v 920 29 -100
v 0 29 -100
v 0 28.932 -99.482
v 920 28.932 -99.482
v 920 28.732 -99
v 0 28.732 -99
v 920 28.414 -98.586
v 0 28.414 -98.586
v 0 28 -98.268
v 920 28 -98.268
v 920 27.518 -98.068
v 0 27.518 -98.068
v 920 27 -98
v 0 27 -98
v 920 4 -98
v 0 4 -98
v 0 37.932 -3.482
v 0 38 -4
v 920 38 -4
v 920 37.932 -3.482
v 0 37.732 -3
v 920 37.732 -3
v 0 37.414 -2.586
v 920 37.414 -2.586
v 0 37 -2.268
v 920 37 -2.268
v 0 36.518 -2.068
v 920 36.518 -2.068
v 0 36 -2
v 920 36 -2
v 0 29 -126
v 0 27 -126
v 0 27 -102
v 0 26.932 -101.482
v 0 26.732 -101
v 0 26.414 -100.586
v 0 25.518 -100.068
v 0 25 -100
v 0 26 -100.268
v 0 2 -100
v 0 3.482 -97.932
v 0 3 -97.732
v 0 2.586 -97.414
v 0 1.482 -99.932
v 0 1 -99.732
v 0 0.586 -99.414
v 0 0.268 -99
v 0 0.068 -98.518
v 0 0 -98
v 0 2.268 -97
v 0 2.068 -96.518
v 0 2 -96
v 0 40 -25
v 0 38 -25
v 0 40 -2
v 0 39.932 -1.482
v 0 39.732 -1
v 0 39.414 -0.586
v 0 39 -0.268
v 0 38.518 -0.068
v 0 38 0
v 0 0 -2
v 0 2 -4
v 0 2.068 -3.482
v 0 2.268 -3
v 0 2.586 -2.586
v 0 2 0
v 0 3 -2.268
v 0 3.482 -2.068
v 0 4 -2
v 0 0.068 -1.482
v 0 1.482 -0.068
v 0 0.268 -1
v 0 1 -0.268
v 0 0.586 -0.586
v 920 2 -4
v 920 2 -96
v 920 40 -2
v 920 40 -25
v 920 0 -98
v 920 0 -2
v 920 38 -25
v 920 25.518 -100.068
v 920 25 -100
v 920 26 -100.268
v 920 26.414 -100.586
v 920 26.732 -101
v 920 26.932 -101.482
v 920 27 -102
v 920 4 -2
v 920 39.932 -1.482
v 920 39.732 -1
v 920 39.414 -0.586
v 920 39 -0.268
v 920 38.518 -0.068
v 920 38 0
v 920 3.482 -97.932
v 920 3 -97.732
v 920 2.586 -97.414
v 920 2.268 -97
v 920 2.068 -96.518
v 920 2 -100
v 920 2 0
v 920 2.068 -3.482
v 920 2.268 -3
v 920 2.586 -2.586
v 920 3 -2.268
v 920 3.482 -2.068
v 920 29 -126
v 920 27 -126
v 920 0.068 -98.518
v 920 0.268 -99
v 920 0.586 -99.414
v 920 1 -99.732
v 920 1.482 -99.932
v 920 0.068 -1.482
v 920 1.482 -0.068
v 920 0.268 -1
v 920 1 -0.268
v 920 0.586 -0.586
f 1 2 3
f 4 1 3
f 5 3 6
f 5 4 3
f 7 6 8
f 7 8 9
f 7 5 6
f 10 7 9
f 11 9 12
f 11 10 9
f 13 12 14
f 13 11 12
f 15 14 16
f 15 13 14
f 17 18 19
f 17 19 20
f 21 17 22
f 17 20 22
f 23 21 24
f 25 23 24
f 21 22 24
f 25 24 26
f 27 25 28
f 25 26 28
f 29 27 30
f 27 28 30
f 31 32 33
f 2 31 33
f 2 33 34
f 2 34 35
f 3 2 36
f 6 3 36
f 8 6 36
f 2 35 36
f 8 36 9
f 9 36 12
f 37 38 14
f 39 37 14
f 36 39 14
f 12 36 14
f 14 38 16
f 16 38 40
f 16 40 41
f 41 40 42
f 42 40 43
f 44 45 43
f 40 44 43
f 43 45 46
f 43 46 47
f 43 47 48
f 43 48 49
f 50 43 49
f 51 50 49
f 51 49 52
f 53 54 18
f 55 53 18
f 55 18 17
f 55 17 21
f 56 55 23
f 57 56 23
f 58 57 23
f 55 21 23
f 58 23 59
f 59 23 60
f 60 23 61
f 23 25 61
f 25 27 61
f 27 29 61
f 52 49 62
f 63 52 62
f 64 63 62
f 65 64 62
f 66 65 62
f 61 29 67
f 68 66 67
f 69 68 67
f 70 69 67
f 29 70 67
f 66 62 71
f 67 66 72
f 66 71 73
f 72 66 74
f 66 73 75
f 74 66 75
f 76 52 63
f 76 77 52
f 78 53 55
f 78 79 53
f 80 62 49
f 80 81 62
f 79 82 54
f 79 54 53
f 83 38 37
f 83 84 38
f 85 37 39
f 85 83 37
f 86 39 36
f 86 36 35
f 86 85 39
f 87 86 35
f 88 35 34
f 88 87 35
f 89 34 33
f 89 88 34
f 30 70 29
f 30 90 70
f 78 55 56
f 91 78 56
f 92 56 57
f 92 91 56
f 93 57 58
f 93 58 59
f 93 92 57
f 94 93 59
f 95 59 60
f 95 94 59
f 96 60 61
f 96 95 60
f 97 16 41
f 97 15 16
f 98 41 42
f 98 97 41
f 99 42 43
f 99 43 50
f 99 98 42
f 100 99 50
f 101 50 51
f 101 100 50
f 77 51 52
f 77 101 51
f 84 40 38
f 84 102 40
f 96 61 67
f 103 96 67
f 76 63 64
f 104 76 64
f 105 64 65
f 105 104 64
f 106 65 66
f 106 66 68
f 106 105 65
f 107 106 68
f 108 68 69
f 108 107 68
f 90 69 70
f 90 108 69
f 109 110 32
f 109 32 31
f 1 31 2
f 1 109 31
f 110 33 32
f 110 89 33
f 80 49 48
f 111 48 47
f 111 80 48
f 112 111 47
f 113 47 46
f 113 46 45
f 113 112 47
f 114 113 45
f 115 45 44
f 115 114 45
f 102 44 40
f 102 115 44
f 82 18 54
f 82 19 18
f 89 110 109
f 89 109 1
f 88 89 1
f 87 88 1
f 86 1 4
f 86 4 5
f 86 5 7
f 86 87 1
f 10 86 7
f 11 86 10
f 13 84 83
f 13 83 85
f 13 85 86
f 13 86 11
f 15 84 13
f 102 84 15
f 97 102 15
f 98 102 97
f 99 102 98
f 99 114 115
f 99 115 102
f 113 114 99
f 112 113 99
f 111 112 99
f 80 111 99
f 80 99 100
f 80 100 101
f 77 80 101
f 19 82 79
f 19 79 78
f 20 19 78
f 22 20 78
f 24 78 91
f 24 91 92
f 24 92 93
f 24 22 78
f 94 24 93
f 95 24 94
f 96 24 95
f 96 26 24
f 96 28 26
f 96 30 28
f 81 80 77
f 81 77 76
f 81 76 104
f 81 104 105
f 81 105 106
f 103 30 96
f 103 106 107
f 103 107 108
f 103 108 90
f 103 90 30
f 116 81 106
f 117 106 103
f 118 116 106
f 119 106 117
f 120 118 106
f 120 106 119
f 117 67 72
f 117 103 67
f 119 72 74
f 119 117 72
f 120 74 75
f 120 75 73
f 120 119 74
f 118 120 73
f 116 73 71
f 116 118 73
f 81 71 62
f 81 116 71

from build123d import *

# Parameters (mm, degrees)
F3_R = 2


with BuildPart() as f2:
    # F2: sweep along a path in F1
    with BuildLine(Plane.XY) as f2_path:
        Line((0, 0), (920, 0))
    # F0 (on Right) → F2 (sweep)
    with BuildSketch(Plane.YZ):
        Polygon((38, -2), (38, -25), (40, -25), (40, 0), (0, 0), (0, -100), (27, -100), (27, -126), (29, -126), (29, -98), (2, -98), (2, -2), align=None)
    sweep(path=f2_path.line)

    # F3
    f3_edges = [f2.edges().sort_by_distance(p)[0] for p in [
        (460, 40, 0),
        (460, 0, 0),
        (460, 29, -98),
        (460, 2, -98),
        (460, 2, -2),
        (460, 38, -2),
        (460, 0, -100),
        (460, 27, -100),
    ]]
    fillet(f3_edges, radius=F3_R)


solid = f2.part
